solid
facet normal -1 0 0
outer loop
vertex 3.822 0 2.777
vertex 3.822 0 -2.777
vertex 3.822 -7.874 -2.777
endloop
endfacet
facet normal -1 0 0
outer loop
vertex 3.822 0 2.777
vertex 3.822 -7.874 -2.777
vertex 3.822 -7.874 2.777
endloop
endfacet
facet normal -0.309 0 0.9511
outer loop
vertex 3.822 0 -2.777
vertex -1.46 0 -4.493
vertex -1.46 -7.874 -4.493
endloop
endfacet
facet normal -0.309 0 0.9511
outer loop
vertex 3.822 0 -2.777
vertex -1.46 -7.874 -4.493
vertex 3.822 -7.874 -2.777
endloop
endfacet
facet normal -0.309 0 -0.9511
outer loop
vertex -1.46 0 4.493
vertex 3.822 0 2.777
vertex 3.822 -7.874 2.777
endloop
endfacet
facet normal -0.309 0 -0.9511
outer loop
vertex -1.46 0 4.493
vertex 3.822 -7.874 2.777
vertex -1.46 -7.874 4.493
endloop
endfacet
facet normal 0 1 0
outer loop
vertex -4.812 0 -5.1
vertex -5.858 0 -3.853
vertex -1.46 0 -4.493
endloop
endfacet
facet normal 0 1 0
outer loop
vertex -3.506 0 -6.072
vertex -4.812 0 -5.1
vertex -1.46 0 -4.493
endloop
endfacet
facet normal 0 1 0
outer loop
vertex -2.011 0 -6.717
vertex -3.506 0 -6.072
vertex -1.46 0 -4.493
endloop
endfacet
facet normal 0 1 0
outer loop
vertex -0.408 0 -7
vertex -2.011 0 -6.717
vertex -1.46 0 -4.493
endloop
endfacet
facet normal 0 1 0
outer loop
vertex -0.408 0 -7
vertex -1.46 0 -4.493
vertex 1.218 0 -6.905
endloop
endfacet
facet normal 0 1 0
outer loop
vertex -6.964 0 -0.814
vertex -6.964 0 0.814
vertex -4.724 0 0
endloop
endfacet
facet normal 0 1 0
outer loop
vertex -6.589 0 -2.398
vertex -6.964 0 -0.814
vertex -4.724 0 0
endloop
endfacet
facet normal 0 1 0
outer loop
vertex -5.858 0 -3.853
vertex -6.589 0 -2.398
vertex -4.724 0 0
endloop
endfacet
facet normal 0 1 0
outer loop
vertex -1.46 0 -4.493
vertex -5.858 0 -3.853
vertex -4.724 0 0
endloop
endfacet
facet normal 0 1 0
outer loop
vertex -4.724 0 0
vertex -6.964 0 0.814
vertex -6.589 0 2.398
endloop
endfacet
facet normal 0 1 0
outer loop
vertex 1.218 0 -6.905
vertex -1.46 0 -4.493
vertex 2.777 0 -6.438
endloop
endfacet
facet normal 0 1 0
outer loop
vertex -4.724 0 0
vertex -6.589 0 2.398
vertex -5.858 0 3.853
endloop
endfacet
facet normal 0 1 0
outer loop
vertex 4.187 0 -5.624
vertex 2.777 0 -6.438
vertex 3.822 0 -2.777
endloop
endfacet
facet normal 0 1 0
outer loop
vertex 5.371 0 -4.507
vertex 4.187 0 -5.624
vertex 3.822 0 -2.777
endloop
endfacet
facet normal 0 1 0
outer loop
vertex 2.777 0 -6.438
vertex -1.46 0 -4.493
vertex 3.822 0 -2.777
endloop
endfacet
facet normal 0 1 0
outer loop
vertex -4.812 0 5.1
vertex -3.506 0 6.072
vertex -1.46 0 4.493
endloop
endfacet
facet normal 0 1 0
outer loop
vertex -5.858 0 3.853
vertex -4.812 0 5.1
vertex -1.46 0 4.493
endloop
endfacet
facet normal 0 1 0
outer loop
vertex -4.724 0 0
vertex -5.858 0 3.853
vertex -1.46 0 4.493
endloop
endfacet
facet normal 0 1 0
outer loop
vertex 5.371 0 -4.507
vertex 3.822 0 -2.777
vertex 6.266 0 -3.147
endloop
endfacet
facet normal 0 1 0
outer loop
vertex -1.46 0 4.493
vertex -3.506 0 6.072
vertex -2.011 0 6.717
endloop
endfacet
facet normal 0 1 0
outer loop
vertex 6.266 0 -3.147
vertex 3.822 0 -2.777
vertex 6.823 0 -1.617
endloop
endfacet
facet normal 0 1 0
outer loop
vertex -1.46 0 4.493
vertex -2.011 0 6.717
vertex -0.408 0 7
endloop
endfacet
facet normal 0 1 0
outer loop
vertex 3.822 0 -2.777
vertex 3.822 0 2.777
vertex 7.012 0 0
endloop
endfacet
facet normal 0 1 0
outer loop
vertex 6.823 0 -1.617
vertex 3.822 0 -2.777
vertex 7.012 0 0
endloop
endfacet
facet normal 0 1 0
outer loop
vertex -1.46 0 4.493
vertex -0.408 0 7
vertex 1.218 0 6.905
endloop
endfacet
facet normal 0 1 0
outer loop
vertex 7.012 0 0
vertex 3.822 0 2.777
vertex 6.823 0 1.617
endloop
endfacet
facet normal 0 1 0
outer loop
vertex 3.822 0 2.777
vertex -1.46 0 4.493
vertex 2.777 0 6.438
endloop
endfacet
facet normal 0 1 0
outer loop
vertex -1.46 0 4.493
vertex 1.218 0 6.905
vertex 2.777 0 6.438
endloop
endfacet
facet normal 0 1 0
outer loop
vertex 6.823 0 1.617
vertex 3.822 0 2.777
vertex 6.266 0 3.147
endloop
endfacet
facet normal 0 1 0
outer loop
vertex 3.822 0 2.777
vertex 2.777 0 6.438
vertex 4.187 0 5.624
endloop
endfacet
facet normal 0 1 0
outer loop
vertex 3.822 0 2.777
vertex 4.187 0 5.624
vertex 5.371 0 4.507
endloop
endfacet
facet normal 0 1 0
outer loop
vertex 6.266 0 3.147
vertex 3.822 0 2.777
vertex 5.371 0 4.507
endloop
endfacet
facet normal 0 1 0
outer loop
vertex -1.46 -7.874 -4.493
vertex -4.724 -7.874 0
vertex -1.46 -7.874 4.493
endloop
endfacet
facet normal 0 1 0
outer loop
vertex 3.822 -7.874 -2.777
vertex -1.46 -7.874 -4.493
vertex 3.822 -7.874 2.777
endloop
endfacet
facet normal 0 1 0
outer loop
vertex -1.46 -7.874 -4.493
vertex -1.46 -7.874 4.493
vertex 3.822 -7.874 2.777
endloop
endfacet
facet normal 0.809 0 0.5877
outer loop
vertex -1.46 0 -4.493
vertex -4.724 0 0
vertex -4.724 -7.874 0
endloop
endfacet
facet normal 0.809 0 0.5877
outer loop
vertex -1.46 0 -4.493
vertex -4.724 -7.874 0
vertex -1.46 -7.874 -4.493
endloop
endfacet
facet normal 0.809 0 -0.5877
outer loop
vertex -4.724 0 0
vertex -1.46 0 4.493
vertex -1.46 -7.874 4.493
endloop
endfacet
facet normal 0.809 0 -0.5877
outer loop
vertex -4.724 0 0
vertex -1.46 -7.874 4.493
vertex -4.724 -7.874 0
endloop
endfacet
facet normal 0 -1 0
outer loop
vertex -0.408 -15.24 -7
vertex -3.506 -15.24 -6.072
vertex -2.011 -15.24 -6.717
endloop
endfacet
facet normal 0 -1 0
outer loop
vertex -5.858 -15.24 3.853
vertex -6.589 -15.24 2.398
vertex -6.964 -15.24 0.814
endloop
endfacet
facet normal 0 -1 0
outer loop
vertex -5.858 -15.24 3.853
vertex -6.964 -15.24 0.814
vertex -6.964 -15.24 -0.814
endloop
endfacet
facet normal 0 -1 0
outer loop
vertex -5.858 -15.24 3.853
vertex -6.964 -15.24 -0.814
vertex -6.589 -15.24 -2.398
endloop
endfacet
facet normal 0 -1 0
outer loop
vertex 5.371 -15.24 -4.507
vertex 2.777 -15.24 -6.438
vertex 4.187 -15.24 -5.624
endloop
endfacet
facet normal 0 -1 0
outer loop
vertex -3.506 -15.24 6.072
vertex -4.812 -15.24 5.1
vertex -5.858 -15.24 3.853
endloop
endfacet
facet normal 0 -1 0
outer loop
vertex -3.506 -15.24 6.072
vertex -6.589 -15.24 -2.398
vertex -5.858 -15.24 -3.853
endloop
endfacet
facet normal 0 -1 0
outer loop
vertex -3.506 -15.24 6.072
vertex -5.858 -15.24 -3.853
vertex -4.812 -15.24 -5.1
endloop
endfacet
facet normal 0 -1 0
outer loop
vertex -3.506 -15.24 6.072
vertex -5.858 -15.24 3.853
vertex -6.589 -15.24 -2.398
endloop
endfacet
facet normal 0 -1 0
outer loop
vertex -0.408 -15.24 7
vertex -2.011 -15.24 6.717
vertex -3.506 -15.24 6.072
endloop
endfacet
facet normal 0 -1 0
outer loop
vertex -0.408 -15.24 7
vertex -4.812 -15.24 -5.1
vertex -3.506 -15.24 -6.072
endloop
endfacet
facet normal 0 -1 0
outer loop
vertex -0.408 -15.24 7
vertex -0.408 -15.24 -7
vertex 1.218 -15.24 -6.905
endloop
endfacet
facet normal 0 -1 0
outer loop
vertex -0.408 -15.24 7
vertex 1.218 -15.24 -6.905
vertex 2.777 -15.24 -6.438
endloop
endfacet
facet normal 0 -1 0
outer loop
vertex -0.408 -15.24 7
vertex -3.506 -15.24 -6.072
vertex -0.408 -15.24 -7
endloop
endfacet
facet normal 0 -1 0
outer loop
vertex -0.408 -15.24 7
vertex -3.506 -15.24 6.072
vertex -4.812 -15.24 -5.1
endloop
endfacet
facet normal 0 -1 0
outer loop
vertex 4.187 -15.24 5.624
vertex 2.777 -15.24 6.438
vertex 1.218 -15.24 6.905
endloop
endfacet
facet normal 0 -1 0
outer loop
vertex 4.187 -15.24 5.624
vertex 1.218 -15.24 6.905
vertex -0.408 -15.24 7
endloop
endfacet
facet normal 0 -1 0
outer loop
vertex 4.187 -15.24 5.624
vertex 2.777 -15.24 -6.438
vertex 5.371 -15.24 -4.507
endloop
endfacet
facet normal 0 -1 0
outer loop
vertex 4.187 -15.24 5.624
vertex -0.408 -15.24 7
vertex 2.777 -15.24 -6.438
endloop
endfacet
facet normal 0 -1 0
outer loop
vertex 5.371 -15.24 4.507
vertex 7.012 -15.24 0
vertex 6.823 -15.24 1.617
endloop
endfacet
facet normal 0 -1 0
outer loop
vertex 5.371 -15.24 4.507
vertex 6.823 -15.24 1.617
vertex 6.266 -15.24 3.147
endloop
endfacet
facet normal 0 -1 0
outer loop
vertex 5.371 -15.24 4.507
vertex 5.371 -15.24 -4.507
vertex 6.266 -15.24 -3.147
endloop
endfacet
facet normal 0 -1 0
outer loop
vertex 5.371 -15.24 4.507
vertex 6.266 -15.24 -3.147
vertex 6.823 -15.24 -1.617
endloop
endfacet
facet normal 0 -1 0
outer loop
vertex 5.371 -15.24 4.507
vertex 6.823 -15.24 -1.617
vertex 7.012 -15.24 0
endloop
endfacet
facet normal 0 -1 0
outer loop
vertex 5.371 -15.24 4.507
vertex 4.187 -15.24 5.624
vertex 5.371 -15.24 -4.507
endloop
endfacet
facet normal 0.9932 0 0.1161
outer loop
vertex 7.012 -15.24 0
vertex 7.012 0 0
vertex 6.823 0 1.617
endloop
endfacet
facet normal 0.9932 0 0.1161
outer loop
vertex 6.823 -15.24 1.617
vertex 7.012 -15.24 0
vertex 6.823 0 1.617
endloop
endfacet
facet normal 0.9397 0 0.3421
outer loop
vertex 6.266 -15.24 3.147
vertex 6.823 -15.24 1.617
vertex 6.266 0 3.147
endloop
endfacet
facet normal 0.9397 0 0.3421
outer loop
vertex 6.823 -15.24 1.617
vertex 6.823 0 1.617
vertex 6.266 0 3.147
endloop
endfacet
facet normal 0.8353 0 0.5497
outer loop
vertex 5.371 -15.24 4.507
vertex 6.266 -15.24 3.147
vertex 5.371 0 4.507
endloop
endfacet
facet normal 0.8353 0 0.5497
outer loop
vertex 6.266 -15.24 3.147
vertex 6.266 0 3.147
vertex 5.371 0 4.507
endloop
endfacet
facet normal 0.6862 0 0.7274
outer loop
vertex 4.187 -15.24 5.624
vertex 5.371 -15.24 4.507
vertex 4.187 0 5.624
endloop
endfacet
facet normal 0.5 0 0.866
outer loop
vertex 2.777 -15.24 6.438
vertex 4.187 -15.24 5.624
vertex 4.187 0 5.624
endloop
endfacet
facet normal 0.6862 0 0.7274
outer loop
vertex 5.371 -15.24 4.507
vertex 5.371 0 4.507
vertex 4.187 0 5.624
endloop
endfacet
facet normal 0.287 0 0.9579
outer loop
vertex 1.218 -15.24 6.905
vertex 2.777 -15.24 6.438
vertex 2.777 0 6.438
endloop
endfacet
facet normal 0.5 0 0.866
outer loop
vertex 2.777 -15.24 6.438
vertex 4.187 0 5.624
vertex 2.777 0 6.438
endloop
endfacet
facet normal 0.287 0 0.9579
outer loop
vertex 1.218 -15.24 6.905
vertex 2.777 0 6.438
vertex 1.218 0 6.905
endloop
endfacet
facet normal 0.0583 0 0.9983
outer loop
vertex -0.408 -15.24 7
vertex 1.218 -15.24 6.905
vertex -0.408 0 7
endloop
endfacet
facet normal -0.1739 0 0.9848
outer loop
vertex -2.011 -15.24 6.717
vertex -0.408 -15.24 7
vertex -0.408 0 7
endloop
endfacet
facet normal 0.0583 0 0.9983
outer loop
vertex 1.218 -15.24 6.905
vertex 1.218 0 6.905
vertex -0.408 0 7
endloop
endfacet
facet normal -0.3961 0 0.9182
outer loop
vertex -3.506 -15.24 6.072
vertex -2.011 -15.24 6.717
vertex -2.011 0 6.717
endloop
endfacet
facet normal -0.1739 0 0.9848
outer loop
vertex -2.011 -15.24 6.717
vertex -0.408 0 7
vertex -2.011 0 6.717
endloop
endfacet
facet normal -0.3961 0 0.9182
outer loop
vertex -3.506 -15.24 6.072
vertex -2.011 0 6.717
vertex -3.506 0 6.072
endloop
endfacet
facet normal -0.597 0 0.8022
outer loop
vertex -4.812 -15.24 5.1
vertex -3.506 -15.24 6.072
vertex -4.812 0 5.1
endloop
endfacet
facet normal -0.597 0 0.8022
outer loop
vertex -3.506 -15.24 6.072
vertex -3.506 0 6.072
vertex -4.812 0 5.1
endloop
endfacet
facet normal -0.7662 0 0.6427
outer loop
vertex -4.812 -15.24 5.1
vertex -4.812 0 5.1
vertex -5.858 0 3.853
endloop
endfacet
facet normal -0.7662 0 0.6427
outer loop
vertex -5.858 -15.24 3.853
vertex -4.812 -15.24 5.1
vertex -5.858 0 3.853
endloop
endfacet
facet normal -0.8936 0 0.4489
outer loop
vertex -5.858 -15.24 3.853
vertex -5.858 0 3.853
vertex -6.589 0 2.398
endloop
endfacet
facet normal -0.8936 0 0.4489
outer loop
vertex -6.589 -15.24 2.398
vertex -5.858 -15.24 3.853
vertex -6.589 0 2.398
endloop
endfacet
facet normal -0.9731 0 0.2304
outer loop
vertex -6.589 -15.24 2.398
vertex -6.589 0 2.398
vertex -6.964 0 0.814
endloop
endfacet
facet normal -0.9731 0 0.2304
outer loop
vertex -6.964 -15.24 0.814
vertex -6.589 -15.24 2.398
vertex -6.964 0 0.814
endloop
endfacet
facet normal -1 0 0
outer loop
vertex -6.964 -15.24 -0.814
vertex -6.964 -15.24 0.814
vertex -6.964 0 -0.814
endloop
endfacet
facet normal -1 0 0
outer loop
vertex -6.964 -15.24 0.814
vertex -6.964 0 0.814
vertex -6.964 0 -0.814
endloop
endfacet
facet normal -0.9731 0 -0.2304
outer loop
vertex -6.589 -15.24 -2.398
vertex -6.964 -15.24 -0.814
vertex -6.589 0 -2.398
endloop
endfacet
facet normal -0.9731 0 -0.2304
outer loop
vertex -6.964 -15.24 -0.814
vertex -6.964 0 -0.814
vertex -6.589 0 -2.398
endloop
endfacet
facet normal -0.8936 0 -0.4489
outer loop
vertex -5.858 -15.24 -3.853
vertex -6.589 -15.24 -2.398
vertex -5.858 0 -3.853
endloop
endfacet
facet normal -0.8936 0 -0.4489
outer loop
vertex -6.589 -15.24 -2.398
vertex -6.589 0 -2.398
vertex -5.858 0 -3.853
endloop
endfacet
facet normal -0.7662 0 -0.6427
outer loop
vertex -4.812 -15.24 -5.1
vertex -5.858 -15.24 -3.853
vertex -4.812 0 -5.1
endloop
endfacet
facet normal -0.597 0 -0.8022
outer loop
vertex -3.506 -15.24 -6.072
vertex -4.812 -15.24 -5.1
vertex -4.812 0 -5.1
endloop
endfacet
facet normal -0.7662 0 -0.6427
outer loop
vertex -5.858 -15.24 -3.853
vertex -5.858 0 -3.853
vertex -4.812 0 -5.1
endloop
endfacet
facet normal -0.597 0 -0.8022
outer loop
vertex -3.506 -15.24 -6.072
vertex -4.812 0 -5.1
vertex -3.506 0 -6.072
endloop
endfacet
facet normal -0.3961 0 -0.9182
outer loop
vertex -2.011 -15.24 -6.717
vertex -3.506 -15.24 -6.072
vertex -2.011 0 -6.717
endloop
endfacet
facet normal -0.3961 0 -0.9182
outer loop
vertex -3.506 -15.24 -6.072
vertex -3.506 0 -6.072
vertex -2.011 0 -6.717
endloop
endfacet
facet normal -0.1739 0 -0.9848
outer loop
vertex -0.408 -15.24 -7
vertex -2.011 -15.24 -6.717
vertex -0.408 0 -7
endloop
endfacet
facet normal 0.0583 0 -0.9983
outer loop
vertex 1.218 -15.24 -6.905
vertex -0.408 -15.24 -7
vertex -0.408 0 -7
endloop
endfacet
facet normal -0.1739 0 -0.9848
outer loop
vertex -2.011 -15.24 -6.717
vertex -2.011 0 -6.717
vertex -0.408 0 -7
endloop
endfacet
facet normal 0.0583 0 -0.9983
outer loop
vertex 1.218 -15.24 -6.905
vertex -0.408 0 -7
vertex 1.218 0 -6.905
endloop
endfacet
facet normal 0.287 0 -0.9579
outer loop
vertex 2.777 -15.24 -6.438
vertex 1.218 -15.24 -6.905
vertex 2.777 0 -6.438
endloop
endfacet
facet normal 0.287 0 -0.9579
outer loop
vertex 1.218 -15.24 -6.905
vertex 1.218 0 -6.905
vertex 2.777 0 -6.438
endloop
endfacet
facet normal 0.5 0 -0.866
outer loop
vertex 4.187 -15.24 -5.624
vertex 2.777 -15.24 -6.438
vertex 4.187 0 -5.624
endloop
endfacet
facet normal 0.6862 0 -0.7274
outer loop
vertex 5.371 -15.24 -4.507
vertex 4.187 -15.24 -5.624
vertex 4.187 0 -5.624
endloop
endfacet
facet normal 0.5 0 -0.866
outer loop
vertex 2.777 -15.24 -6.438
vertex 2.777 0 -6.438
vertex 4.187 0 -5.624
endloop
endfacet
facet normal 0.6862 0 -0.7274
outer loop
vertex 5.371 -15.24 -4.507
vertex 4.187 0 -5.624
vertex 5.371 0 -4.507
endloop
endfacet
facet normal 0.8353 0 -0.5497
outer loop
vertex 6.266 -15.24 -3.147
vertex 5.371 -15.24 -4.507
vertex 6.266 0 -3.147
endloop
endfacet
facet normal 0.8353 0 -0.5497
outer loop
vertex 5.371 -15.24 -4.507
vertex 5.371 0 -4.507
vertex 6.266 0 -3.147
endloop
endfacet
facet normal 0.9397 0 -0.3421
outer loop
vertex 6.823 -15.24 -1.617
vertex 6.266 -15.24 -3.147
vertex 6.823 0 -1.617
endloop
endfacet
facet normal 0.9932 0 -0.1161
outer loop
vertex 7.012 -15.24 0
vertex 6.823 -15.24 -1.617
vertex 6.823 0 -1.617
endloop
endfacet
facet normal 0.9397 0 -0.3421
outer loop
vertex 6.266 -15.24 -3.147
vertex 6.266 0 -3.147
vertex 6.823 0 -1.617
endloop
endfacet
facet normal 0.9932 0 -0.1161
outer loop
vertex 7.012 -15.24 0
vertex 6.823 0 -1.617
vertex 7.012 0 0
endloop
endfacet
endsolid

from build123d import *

# Parameters (mm, degrees)
F0_R     = 7.011876
F1_DEPTH = 15.24
F3_DEPTH = 7.874


with BuildPart() as f1:
    # F0 (on Front) → F1 (new body)
    with BuildSketch(Plane.XZ):
        Circle(F0_R)
    extrude(amount=F1_DEPTH)

    # F2 (on Front) → F3 (cut)
    with BuildSketch(Plane.XZ):
        Polygon((3.822133, -2.776942), (3.822133, 2.776942), (-1.459925, 4.493186), (-4.724416, 0), (-1.459925, -4.493186), align=None)
    extrude(amount=F3_DEPTH, mode=Mode.SUBTRACT)


solid = f1.part
